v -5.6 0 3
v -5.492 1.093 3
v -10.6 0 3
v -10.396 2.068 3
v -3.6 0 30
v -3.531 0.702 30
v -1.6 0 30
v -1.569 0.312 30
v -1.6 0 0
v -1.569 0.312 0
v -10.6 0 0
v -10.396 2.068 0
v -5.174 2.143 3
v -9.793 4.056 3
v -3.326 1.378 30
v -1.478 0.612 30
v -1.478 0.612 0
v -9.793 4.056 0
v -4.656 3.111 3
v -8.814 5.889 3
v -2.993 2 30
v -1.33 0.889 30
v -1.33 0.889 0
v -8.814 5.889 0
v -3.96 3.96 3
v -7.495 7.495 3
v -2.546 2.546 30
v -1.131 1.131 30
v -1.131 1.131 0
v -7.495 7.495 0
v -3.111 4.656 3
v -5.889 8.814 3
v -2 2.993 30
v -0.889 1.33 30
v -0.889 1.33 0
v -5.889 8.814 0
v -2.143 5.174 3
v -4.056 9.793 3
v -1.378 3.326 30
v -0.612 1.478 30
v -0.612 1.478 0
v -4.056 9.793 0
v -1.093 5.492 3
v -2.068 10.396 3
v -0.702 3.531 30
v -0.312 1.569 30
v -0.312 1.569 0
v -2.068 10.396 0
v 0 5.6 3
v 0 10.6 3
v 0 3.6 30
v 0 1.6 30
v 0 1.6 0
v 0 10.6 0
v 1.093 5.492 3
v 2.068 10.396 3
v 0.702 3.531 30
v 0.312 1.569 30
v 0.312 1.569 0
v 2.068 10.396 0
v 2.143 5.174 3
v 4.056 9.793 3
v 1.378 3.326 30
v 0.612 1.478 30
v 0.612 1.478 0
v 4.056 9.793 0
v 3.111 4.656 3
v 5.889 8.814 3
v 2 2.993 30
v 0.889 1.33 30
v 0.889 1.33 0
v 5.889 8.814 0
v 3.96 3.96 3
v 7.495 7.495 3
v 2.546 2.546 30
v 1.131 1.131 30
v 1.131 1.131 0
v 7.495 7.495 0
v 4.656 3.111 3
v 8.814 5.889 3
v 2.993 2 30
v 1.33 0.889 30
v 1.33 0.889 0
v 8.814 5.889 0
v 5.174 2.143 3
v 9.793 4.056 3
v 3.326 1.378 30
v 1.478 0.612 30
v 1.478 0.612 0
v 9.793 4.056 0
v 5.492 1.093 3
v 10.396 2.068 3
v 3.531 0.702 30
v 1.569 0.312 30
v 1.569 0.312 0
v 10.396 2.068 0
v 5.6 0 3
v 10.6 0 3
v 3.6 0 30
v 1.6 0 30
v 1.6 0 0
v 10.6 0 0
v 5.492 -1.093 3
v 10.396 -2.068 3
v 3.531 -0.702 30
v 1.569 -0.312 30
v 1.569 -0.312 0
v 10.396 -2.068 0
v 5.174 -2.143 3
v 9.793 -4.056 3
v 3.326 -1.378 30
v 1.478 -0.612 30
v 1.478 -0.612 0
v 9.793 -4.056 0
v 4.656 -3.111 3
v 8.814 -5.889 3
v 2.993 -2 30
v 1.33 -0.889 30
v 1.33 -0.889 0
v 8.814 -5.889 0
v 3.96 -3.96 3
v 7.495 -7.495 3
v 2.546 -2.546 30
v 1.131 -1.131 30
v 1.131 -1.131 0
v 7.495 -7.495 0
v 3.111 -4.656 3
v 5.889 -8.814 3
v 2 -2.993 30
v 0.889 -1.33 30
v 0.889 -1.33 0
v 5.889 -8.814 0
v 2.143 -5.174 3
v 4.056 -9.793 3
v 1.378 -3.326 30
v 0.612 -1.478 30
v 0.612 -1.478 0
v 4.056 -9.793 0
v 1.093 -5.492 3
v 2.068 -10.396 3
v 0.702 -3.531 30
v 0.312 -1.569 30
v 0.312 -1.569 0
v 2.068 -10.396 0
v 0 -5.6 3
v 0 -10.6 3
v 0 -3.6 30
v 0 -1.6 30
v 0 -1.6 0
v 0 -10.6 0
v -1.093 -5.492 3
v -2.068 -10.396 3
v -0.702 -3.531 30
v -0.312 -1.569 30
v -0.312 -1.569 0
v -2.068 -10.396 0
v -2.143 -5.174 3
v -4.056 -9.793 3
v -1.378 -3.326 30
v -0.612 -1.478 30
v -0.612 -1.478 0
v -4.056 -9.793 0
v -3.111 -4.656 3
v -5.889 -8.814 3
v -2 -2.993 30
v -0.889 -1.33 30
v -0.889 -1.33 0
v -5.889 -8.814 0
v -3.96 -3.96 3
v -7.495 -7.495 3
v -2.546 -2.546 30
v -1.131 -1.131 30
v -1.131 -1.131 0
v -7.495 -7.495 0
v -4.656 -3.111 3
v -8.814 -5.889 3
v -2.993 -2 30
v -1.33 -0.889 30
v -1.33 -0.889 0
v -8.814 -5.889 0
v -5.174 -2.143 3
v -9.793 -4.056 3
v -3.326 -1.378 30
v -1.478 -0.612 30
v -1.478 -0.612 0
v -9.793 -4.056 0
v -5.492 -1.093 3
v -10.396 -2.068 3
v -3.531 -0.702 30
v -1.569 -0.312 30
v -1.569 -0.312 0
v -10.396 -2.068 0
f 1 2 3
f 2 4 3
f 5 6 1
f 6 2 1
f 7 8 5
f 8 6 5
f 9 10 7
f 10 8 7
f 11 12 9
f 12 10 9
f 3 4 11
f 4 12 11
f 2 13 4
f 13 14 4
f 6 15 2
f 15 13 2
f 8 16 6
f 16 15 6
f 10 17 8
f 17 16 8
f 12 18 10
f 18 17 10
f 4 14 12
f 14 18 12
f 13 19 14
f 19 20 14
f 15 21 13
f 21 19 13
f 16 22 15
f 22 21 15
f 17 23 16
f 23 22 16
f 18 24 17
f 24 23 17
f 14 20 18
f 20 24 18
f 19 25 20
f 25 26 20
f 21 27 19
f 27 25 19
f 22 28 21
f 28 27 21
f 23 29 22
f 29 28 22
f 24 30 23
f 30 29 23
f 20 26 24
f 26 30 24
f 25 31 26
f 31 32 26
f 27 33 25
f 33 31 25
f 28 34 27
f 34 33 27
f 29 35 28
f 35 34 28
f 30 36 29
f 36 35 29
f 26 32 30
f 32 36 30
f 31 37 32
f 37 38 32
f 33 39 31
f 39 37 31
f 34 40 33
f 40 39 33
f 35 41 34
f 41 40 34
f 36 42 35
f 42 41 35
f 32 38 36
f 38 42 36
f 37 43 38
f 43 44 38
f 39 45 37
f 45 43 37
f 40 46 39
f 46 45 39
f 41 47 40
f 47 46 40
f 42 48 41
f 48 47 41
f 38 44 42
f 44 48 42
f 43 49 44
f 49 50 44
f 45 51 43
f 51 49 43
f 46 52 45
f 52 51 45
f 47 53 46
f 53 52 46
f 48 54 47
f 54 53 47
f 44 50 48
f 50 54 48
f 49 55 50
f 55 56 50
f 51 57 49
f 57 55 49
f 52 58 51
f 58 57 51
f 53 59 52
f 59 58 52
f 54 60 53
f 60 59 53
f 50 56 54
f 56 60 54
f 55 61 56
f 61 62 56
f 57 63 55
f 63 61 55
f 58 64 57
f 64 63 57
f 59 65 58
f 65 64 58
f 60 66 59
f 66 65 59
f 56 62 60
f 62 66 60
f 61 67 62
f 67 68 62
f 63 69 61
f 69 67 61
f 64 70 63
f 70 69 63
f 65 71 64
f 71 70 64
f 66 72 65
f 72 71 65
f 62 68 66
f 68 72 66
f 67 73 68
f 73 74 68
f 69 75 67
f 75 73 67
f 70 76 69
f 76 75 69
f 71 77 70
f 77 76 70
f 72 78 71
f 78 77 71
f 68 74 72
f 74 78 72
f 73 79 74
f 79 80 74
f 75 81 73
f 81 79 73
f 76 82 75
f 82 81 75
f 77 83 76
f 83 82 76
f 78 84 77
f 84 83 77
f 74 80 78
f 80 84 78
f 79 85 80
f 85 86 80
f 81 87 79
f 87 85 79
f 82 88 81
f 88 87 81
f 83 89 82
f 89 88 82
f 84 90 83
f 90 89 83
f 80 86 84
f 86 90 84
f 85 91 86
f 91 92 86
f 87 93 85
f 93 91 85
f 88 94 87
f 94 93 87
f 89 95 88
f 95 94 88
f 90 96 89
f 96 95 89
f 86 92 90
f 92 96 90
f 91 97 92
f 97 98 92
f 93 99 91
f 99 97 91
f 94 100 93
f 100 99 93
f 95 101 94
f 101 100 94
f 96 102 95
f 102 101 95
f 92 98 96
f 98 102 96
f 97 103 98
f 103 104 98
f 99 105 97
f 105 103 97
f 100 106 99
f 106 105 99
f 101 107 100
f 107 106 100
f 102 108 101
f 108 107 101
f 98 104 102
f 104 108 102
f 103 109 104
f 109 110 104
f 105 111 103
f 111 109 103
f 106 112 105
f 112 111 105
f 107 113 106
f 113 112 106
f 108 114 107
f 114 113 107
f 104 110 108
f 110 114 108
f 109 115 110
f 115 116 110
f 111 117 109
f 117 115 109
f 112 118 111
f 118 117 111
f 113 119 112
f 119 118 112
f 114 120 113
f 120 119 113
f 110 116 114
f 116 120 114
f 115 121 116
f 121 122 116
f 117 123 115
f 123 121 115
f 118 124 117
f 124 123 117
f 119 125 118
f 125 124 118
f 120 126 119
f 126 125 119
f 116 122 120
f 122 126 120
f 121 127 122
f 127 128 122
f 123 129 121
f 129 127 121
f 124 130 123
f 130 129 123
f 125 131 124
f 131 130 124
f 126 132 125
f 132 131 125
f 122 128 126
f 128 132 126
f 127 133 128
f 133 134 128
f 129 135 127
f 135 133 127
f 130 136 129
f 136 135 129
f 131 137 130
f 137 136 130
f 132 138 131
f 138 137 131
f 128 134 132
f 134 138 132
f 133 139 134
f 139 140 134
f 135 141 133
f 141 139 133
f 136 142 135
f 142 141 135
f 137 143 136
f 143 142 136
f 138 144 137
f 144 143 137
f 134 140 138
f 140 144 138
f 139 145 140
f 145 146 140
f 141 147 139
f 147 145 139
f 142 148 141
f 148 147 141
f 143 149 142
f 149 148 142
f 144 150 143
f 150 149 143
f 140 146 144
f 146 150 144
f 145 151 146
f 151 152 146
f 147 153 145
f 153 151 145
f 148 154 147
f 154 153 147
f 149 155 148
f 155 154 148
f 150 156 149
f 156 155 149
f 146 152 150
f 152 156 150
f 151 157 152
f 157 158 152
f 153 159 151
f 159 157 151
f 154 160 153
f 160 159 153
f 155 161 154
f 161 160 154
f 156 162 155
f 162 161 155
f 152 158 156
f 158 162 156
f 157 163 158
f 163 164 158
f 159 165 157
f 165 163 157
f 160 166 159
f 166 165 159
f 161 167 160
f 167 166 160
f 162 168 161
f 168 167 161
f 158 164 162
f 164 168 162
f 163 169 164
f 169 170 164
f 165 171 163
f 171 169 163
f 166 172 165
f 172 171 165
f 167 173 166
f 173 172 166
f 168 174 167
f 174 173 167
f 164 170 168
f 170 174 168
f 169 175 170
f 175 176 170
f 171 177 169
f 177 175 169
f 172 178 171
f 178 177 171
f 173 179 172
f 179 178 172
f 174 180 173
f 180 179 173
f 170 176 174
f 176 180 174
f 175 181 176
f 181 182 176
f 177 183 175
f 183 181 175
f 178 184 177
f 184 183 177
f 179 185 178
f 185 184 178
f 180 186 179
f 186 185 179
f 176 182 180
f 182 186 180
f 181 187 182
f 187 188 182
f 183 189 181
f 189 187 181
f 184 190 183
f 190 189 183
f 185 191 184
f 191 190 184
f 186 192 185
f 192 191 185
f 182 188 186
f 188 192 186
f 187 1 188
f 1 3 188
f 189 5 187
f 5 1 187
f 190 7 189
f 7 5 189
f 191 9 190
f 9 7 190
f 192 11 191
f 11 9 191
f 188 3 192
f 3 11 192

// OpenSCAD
$fn = 32;

// ----------------------------------------------------------------------
// Profiled standoff: conical spacer, 30 mm long, bore 3.2 mm
// ----------------------------------------------------------------------

// --- parameters (mm) ---
revolve_angle = 360;      // full turn around the Z axis
profile_points = 6;       // points of the closed outline

profile = [[1.6, 0], [10.6, 0], [10.6, 3], [5.6, 3], [3.6, 30], [1.6, 30]];  // single closed polygon, 6 points, counter clockwise

// --- the one profile operation ---
rotate_extrude(angle = revolve_angle) polygon(points = profile);
